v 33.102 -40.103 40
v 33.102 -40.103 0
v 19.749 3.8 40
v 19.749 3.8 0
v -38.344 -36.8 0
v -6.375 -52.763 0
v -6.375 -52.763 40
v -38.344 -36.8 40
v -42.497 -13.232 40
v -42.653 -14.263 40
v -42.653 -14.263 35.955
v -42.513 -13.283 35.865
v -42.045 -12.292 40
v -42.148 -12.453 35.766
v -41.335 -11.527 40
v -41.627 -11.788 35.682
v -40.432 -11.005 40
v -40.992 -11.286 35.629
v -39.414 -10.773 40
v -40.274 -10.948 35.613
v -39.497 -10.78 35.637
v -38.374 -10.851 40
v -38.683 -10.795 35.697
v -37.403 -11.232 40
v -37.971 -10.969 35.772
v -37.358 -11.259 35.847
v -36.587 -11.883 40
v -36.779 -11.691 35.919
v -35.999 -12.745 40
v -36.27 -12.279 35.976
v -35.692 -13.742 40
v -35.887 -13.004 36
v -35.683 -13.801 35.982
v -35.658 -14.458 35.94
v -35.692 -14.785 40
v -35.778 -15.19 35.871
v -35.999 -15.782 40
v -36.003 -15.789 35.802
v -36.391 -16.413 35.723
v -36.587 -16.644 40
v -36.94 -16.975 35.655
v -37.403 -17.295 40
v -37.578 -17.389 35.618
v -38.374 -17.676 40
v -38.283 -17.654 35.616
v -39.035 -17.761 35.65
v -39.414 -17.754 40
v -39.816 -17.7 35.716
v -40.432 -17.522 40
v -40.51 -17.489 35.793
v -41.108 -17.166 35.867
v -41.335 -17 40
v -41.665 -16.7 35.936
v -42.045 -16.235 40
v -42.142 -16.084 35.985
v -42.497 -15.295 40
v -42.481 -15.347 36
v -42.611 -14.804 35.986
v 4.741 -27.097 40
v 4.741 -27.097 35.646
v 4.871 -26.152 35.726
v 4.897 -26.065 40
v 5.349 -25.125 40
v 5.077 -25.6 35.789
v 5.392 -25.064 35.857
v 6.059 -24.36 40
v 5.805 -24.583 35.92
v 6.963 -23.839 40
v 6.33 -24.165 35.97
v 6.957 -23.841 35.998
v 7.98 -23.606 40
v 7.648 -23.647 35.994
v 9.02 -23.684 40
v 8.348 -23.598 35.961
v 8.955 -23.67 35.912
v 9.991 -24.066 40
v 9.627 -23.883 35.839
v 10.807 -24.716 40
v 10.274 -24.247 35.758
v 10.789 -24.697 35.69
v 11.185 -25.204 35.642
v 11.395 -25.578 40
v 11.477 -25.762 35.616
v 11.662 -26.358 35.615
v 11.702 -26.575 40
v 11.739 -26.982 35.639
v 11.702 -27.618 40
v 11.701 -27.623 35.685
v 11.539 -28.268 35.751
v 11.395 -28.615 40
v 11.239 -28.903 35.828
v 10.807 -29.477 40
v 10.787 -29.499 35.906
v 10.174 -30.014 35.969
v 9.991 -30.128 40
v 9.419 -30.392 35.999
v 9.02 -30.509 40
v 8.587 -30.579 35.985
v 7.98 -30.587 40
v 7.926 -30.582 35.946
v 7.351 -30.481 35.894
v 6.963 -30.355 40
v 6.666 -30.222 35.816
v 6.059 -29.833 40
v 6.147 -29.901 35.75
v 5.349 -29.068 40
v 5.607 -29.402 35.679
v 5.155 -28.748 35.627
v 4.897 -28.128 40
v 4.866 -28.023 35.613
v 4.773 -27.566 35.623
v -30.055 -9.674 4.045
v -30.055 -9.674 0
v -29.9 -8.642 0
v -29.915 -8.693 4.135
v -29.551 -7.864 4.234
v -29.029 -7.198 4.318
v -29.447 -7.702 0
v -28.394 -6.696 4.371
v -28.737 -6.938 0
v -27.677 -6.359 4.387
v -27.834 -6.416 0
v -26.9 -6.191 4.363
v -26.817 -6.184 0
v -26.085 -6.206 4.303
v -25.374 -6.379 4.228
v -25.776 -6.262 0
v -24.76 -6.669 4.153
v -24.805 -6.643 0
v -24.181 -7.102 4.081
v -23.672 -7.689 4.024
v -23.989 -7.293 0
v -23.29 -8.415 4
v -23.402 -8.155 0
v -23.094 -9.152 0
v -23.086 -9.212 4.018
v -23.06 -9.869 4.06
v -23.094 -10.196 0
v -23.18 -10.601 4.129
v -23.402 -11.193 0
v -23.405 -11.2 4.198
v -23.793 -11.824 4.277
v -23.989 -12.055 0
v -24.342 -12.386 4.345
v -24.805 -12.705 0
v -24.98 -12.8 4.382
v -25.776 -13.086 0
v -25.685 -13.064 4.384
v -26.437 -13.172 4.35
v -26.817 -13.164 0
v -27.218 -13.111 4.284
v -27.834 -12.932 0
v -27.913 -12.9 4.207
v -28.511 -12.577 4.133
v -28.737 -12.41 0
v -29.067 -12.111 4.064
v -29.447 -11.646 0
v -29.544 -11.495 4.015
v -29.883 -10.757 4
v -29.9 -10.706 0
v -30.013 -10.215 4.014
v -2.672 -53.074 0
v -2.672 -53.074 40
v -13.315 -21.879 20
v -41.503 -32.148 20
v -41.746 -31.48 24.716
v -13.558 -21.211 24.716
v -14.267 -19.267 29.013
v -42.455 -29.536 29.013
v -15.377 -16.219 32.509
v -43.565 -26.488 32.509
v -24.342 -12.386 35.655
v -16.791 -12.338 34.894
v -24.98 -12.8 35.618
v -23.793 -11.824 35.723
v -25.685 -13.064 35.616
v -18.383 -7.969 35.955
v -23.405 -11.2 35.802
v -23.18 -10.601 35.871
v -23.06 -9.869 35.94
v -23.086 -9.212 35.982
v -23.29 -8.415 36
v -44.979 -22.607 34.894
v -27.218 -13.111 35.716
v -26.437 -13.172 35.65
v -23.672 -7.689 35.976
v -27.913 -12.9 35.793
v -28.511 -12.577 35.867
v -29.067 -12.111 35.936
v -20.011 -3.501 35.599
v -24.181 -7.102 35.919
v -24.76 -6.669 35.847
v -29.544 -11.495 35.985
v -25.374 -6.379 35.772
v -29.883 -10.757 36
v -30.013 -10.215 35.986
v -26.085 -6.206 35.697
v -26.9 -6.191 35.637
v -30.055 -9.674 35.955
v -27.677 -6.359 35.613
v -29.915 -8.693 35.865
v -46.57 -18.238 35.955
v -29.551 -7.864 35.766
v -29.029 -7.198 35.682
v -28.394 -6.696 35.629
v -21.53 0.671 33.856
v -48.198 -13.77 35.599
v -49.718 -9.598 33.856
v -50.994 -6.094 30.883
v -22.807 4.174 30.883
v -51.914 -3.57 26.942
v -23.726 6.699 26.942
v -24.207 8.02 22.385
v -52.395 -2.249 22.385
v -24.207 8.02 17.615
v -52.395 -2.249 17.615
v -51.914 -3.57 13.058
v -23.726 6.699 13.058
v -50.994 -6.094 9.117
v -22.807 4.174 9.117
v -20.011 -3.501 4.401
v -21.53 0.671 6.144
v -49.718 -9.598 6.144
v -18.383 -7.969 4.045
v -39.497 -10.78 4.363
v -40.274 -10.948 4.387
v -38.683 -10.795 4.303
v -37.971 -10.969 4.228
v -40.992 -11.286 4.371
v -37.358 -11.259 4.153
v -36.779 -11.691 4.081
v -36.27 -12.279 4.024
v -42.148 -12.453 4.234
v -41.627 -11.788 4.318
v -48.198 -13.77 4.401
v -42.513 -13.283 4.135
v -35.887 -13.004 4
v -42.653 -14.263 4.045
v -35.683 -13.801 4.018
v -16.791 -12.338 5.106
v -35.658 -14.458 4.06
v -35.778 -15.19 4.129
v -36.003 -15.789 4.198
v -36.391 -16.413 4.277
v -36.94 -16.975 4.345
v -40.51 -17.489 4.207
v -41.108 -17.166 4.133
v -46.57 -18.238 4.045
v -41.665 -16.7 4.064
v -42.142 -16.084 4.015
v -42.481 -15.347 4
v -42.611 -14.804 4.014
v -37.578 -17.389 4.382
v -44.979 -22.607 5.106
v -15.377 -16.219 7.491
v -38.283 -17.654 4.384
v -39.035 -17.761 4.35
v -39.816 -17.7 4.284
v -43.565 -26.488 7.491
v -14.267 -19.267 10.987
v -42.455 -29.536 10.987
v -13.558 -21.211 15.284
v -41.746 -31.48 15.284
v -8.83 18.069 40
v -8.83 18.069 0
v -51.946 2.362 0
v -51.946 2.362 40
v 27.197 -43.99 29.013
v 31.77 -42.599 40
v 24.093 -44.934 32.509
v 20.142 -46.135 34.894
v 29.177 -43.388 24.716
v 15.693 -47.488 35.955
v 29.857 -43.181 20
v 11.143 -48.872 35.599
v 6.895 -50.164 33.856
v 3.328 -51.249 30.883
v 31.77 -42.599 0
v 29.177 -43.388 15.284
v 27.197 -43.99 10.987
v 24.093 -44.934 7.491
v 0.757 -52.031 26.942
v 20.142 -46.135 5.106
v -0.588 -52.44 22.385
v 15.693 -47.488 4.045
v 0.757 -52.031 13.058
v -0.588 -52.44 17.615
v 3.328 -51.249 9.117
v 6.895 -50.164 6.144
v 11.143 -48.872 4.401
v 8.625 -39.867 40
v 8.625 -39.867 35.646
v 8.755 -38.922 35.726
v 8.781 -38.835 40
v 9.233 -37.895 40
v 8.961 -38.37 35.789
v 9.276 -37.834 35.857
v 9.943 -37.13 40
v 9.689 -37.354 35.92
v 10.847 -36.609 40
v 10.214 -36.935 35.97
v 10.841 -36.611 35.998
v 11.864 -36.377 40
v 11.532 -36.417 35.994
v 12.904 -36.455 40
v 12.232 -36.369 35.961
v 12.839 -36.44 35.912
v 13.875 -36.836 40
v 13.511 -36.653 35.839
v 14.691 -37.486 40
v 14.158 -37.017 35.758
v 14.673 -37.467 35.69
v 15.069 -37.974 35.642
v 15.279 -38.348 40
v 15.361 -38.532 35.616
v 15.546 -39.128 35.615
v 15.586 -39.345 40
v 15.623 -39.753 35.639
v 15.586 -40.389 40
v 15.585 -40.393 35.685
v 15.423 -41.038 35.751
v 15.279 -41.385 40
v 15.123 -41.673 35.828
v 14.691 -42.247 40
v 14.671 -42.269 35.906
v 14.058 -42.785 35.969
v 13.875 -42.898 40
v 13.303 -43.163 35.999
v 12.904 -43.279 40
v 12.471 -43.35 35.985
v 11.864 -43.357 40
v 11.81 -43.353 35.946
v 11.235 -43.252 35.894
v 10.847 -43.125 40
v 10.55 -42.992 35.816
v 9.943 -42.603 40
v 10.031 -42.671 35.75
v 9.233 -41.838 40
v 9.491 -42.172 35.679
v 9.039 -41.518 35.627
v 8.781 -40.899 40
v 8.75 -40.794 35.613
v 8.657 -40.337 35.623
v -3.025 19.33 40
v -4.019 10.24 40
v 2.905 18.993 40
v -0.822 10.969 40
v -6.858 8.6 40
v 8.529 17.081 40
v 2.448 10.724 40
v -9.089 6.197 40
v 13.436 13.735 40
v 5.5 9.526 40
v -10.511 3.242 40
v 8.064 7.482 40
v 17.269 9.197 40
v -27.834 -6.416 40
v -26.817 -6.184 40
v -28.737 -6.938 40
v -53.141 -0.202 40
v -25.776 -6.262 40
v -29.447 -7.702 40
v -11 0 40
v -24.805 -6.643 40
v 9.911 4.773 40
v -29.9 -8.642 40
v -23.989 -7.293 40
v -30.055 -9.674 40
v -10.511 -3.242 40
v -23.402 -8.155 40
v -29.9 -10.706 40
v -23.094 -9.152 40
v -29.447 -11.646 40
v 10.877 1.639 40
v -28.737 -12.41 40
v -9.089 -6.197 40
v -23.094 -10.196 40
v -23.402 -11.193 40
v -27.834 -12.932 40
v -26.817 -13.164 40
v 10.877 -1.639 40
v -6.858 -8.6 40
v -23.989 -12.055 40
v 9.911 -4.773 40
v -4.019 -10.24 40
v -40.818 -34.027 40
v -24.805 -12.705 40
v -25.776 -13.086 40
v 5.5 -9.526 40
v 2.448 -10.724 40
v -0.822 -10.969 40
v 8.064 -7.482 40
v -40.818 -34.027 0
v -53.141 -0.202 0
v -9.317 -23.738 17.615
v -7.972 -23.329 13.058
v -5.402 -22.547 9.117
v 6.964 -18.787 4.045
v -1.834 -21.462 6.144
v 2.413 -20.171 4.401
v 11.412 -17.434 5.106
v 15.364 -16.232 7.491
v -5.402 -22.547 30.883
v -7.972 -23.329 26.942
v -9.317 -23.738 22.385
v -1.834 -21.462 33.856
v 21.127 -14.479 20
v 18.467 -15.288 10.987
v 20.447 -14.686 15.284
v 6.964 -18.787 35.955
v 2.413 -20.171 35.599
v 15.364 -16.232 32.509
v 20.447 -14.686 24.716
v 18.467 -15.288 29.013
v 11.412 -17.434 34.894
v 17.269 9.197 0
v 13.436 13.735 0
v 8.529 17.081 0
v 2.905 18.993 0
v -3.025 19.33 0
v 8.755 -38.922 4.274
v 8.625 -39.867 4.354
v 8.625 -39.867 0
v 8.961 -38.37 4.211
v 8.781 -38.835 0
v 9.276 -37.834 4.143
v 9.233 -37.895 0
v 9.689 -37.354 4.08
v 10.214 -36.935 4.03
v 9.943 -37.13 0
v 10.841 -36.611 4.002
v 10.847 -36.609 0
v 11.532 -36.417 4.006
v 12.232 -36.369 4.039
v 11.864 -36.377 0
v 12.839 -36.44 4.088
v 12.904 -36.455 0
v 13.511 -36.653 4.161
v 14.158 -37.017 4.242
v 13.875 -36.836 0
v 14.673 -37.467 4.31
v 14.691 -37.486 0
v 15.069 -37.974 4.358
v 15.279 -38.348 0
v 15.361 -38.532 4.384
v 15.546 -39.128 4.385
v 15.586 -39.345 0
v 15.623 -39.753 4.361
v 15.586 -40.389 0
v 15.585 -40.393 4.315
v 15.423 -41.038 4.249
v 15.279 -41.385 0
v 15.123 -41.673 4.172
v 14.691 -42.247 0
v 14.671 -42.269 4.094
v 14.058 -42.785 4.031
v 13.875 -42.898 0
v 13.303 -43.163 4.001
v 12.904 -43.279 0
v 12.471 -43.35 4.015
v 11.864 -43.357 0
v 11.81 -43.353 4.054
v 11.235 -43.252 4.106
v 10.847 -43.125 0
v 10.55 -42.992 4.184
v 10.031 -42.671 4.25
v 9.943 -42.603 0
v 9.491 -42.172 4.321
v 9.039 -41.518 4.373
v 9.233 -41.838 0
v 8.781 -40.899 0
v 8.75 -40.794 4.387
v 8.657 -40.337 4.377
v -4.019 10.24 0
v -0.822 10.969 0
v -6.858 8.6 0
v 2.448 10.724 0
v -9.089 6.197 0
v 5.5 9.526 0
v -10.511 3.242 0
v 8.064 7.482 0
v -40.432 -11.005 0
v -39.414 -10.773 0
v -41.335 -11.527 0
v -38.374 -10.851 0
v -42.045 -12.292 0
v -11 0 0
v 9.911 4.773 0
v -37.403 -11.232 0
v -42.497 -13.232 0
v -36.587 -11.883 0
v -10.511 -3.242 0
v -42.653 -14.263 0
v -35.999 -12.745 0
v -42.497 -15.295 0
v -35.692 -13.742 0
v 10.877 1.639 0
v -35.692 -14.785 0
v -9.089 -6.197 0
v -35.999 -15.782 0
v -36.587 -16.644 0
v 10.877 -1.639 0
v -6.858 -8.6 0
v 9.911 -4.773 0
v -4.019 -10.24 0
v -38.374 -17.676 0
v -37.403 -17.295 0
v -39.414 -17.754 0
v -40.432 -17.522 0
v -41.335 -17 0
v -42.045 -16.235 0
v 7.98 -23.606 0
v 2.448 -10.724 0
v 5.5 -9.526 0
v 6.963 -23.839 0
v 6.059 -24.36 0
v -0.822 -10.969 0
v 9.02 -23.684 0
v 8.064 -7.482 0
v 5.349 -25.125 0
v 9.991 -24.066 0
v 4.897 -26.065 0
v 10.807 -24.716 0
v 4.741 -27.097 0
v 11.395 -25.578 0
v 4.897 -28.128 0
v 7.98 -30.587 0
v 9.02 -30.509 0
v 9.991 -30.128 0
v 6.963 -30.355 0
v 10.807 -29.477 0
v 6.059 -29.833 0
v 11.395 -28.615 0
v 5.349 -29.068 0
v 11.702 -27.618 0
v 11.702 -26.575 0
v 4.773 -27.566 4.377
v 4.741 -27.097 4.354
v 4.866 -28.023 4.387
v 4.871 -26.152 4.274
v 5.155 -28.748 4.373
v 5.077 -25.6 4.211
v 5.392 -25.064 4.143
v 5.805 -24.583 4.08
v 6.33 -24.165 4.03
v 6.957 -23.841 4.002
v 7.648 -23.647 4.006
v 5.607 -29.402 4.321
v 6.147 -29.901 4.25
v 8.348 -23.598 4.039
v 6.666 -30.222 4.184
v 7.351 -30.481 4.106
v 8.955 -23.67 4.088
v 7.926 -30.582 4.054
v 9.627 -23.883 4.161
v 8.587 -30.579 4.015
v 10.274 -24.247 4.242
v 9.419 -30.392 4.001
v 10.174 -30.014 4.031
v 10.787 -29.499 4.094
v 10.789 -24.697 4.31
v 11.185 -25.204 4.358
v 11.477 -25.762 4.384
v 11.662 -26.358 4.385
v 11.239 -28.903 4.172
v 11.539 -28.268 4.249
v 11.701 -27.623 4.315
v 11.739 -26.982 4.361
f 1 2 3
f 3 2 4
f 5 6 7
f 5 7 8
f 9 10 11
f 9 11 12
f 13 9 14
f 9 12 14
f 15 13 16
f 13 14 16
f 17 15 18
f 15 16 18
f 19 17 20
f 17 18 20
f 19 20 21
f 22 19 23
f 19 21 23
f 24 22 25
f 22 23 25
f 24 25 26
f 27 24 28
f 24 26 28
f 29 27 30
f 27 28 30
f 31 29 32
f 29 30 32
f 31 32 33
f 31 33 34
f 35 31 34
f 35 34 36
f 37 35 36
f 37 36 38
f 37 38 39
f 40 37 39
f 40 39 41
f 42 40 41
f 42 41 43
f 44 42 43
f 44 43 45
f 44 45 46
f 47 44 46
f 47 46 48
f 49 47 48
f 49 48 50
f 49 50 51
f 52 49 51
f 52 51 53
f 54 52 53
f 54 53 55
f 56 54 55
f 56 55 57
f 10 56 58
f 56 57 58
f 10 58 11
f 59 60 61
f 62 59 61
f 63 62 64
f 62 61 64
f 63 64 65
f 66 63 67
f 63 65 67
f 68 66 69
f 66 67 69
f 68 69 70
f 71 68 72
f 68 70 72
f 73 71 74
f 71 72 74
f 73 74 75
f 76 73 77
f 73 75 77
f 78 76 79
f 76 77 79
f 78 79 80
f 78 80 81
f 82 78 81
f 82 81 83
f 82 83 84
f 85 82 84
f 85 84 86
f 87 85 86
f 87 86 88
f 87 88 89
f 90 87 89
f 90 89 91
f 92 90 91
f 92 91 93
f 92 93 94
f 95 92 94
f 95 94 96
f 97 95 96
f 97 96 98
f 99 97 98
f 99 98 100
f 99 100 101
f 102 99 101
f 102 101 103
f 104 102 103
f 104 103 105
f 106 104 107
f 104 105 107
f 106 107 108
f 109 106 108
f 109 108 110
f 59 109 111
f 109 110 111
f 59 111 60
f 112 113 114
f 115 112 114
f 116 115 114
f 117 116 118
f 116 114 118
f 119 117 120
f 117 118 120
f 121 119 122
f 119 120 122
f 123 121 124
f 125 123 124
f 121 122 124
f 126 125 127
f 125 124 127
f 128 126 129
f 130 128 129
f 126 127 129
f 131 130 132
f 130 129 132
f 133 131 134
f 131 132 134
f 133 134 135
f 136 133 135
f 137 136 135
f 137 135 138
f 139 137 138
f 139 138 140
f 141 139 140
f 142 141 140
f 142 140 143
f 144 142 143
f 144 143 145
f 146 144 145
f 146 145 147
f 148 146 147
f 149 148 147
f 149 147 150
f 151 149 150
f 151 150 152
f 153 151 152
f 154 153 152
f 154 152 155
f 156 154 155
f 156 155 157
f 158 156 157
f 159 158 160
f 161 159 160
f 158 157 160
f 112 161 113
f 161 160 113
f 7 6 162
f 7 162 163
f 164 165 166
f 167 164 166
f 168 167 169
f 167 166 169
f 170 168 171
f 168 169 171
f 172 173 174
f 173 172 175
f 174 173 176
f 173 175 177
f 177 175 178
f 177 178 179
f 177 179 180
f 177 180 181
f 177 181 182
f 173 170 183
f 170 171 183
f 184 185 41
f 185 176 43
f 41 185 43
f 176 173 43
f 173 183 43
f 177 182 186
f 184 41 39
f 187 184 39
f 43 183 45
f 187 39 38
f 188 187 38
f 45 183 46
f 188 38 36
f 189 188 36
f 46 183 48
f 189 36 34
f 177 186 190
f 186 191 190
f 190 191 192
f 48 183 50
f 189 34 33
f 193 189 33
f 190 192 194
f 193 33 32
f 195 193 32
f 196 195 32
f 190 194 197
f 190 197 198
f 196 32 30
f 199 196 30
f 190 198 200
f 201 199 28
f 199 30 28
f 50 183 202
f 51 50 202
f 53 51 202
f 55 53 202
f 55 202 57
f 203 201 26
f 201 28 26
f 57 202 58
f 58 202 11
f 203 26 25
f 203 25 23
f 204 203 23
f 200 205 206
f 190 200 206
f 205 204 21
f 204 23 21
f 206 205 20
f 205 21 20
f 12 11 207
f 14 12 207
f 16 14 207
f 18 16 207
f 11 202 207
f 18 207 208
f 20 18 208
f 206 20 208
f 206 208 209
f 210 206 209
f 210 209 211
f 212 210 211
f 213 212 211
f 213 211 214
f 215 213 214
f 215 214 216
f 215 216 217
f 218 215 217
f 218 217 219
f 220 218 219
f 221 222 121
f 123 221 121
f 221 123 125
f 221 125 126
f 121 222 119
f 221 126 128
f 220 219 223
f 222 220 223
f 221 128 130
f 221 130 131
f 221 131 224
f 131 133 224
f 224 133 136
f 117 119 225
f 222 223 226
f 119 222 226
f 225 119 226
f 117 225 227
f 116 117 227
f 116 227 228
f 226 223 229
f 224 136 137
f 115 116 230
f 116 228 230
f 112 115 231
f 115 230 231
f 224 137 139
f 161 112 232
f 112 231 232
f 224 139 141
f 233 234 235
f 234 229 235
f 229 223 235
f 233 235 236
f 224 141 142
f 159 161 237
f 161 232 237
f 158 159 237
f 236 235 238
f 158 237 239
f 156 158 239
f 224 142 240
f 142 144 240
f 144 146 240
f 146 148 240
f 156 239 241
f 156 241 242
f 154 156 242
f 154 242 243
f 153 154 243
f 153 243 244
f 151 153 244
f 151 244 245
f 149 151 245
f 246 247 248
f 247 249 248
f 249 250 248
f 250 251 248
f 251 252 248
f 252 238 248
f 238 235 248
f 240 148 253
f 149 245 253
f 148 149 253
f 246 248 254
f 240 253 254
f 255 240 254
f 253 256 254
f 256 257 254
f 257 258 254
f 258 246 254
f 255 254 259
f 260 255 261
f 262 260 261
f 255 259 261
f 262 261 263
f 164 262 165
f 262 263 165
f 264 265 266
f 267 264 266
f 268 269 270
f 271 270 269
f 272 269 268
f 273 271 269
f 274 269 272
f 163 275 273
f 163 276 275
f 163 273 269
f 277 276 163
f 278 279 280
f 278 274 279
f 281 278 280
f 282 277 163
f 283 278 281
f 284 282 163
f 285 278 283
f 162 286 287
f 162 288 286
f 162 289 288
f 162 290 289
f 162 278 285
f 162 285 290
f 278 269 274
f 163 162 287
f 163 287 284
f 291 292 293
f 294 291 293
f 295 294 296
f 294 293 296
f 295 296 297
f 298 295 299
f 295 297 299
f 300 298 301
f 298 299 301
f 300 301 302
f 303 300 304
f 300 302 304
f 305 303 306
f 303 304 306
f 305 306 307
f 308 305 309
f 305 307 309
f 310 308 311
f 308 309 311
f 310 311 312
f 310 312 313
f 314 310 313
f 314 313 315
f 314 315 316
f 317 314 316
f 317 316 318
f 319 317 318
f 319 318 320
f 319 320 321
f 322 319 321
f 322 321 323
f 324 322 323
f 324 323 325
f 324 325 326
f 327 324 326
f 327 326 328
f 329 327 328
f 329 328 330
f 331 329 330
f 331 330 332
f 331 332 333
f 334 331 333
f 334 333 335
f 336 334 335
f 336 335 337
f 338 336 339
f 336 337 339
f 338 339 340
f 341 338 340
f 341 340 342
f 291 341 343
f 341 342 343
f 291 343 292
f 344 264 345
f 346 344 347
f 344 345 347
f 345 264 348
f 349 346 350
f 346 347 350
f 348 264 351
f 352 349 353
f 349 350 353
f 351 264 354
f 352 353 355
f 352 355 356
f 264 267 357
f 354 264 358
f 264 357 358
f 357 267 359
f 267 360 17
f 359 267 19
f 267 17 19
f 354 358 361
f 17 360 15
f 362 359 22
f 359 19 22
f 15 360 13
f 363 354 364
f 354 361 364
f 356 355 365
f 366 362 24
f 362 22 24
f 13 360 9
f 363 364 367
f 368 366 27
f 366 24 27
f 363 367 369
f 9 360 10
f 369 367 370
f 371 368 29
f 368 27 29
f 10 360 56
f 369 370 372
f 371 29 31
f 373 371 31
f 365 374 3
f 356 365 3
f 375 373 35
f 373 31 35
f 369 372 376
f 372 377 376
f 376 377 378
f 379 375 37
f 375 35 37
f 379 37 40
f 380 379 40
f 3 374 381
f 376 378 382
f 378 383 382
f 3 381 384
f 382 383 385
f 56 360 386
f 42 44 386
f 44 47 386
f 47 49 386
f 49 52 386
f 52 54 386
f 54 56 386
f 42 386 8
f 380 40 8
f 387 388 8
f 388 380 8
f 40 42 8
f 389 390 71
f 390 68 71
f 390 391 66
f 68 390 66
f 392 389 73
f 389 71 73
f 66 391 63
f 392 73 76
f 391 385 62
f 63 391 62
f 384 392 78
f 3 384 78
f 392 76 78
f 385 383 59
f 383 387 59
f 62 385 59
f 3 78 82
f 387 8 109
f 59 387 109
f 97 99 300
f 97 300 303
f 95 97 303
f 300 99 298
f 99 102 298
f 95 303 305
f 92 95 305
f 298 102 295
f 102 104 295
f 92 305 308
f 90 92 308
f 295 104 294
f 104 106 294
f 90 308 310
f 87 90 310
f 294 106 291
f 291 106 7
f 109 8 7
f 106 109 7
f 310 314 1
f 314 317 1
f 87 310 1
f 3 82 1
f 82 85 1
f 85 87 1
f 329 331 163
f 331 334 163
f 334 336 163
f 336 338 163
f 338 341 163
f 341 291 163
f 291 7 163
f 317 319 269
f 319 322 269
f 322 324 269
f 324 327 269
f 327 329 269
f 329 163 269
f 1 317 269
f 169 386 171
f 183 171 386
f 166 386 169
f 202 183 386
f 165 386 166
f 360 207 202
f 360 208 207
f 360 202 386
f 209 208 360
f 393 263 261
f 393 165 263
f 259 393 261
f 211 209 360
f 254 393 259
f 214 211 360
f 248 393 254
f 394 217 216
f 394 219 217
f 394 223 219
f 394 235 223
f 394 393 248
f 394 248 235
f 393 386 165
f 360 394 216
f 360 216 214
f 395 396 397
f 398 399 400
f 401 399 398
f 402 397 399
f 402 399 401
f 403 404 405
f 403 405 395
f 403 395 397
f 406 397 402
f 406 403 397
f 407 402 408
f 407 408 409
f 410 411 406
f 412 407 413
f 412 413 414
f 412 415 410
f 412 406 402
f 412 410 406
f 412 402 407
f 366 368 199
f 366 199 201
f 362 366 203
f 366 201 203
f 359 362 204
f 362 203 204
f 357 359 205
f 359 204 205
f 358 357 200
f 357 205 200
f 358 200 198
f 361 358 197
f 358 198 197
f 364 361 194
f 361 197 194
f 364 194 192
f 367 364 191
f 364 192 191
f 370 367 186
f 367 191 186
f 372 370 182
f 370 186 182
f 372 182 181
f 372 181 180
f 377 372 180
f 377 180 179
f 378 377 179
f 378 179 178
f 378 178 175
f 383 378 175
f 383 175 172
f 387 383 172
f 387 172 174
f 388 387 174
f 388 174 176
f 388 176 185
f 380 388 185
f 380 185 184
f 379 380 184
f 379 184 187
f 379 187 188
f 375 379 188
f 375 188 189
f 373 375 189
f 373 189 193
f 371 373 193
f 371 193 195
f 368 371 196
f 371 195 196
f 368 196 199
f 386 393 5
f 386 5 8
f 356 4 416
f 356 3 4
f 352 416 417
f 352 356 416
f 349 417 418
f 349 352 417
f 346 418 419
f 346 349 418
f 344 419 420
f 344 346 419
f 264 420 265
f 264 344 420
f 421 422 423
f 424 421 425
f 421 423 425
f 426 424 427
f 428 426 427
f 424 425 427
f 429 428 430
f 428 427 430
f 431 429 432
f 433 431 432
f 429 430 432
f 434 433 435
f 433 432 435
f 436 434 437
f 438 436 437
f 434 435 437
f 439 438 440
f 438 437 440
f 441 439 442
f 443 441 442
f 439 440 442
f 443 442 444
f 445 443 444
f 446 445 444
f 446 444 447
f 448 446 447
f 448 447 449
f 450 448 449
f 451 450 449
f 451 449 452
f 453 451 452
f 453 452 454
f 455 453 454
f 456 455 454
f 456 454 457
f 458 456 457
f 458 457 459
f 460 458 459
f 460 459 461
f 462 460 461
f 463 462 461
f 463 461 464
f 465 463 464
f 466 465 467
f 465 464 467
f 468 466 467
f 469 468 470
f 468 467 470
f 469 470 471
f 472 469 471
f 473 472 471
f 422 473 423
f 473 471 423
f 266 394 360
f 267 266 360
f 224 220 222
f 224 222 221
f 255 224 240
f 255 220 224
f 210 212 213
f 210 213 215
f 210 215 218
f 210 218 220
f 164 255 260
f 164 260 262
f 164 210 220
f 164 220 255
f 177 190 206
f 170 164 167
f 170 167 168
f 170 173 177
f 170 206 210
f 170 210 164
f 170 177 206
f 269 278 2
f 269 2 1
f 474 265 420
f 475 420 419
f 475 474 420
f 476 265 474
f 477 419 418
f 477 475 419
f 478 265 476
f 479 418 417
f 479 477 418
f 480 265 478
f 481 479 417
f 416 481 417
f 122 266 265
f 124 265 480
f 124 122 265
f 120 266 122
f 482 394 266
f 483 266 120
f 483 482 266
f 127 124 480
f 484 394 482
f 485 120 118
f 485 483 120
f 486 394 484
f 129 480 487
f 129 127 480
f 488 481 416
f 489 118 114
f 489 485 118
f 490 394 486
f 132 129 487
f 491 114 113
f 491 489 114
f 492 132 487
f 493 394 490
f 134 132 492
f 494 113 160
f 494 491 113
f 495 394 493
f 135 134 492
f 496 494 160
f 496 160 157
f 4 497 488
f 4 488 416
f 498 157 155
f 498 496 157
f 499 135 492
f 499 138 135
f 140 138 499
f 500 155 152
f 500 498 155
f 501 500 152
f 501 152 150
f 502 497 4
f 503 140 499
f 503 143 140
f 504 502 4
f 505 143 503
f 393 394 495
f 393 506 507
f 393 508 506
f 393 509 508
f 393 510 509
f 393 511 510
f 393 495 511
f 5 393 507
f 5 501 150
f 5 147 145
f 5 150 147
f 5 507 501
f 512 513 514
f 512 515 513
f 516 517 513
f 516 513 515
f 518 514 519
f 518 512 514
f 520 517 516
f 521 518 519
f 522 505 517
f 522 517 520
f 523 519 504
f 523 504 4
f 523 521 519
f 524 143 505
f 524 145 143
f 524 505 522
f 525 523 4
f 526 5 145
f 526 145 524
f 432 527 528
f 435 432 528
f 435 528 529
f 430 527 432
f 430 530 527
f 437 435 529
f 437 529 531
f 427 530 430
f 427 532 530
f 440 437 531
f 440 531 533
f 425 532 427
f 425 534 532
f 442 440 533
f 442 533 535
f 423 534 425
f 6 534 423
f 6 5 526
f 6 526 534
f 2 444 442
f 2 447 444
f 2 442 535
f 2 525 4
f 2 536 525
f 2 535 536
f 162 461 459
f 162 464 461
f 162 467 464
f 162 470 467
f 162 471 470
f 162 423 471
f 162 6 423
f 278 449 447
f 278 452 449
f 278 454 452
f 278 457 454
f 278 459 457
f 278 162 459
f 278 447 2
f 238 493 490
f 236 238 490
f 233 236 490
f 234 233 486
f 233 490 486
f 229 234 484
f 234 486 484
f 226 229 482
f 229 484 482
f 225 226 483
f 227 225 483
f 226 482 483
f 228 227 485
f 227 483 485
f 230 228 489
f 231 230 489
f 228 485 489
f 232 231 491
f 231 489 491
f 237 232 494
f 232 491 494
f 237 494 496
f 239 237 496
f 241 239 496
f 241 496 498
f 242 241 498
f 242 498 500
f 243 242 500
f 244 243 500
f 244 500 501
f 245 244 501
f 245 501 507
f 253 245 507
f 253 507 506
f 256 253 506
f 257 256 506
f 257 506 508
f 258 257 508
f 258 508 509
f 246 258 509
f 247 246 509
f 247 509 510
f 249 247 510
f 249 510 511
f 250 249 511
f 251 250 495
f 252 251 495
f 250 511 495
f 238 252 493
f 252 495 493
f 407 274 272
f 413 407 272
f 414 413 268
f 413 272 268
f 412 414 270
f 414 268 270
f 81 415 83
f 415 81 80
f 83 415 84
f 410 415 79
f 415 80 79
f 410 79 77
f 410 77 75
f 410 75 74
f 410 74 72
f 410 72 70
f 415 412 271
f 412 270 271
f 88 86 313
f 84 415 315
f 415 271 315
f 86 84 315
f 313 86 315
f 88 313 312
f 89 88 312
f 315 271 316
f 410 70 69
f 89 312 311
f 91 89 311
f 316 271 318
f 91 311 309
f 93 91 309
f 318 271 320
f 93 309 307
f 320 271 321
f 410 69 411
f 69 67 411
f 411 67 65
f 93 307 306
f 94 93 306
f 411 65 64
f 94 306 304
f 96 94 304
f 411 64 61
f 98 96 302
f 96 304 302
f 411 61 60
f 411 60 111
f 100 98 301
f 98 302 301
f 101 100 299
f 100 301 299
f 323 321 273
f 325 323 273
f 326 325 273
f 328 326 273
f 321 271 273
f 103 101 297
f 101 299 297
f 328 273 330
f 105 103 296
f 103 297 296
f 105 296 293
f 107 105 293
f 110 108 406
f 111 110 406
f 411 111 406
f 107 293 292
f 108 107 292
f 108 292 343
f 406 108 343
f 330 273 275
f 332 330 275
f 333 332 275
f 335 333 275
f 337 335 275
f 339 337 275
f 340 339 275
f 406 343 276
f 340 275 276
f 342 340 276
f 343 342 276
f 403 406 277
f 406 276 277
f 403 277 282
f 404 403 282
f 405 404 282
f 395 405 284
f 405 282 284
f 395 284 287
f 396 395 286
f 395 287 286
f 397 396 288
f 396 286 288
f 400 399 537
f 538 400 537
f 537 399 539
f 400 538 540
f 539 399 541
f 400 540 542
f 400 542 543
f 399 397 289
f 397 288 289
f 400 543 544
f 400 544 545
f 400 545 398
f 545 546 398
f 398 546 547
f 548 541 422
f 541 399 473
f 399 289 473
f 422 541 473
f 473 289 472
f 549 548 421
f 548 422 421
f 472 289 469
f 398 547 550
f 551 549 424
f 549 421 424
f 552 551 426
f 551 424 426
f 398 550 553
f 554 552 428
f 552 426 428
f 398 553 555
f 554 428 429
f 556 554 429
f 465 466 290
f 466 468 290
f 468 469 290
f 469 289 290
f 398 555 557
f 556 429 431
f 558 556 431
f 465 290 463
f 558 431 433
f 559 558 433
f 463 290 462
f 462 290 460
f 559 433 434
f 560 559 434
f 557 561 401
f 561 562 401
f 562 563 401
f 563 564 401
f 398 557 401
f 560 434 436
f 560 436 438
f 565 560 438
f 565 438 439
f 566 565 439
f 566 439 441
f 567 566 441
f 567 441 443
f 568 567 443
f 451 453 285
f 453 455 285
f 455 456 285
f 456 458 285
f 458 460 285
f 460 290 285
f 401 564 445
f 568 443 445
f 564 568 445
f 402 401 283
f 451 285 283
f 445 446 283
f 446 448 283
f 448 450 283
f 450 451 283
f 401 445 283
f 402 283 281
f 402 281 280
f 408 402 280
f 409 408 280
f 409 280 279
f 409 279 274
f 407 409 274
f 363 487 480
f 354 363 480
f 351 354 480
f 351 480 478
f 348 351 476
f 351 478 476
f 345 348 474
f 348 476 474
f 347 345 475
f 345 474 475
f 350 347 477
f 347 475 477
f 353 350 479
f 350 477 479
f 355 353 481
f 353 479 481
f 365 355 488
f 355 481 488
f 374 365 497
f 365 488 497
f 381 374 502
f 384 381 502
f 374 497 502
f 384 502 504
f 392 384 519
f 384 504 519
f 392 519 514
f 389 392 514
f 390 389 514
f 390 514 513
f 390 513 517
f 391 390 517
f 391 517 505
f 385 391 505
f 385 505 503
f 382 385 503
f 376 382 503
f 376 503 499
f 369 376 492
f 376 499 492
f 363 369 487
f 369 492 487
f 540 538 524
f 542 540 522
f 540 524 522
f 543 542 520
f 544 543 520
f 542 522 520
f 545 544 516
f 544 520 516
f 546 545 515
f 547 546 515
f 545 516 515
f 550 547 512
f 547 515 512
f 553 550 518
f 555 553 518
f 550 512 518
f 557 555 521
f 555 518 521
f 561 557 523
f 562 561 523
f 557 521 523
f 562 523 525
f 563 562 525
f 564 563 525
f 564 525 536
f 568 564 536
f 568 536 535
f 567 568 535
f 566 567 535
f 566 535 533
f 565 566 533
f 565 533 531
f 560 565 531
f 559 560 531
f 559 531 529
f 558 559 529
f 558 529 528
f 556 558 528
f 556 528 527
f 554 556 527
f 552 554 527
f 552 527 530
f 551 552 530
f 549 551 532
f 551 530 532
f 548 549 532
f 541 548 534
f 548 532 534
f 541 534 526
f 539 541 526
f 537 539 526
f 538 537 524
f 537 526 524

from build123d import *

# Parameters (mm, degrees)
BOSS_EXTRUDE1_DEPTH = 40
SKETCH2_R           = 16
CUT_EXTRUDE1_DEPTH  = 30
SKETCH3_R           = 16
CUT_EXTRUDE2_DEPTH  = 30
CUT_EXTRUDE3_REACH  = 87.885
SKETCH4_R           = 3.5
SKETCH6_W           = 97.811122408
SKETCH6_H           = 40
BOSS_EXTRUDE2_DEPTH = 30
SKETCH5_R           = 11
CUT_EXTRUDE4_DEPTH  = 40
CUT_EXTRUDE7_DEPTH  = 40
FILLET1_R           = 22
CHAMFER1_SIZE       = 2
CHAMFER2_SIZE       = 2


with BuildPart() as part:
    # Sketch1 → Boss-Extrude1 (new body)
    with BuildSketch(Plane.XY):
        Polygon((-40.424029814, 28.51734538), (47.085187233, -15.176505431), (33.683689612, -42.016771106), (-53.825527435, 1.677079705), align=None)
        Polygon((-53.825527435, 1.677079705), (33.683689612, -42.016771106), (-4.585446216, -53.656068464), (-40.133712767, -35.906616376), align=None)
    extrude(amount=BOSS_EXTRUDE1_DEPTH)

    # Sketch2 → Cut-Extrude1 (cut)
    with BuildSketch(Plane(origin=(14.549121698, -47.836419785, 0), x_dir=(-0.9567283956954932, -0.29098243395423, 0), z_dir=(0.29098243395423, -0.9567283956954933, 0))):
        with Locations(Location((0, -20, 0), (0, 0, 180))):
            Circle(SKETCH2_R)
    extrude(amount=-CUT_EXTRUDE1_DEPTH, mode=Mode.SUBTRACT)

    # Sketch3 → Cut-Extrude2 (cut)
    with BuildSketch(Plane(origin=(-46.979620101, -17.114768336, 0), x_dir=(0, 0, 1), z_dir=(-0.939592402016652, -0.342295366712111, 0))):
        with Locations(Location((20, 0, 0), (0, 0, 270))):
            Circle(SKETCH3_R)
    extrude(amount=-CUT_EXTRUDE2_DEPTH, mode=Mode.SUBTRACT)

    # Cut-Extrude3: up to this face of the body (flat: up to its plane)
    cut_extrude3_end = Plane(part.part.faces().sort_by_distance((-8.066388037, -16.155209221, 40))[0])
    # Sketch4 → Cut-Extrude3 (cut, up to the picked face)
    with BuildSketch(Plane(origin=(0, 0, 0), x_dir=(-1, 0, 0), z_dir=(0, 0, -1)), mode=Mode.PRIVATE) as cut_extrude3_sk1:
        with Locations((-8.241246184, -27.096598695)):
            Circle(SKETCH4_R)
    cut_extrude3_tool1 = split(extrude(cut_extrude3_sk1.sketch, amount=-CUT_EXTRUDE3_REACH, mode=Mode.PRIVATE), bisect_by=cut_extrude3_end, keep=Keep.BOTH, mode=Mode.PRIVATE)
    # Sketch4 → Cut-Extrude3 (cut, up to the picked face)
    with BuildSketch(Plane(origin=(0, 0, 0), x_dir=(-1, 0, 0), z_dir=(0, 0, -1)), mode=Mode.PRIVATE) as cut_extrude3_sk2:
        with Locations((-12.125238023, -39.866872249)):
            Circle(SKETCH4_R)
    cut_extrude3_tool2 = split(extrude(cut_extrude3_sk2.sketch, amount=-CUT_EXTRUDE3_REACH, mode=Mode.PRIVATE), bisect_by=cut_extrude3_end, keep=Keep.BOTH, mode=Mode.PRIVATE)
    # Sketch4 → Cut-Extrude3 (cut, up to the picked face)
    with BuildSketch(Plane(origin=(0, 0, 0), x_dir=(-1, 0, 0), z_dir=(0, 0, -1)), mode=Mode.PRIVATE) as cut_extrude3_sk3:
        with Locations((26.555072549, -9.674065347)):
            Circle(SKETCH4_R)
    cut_extrude3_tool3 = split(extrude(cut_extrude3_sk3.sketch, amount=-CUT_EXTRUDE3_REACH, mode=Mode.PRIVATE), bisect_by=cut_extrude3_end, keep=Keep.BOTH, mode=Mode.PRIVATE)
    # Sketch4 → Cut-Extrude3 (cut, up to the picked face)
    with BuildSketch(Plane(origin=(0, 0, 0), x_dir=(-1, 0, 0), z_dir=(0, 0, -1)), mode=Mode.PRIVATE) as cut_extrude3_sk4:
        with Locations((39.152815392, -14.263447931)):
            Circle(SKETCH4_R)
    cut_extrude3_tool4 = split(extrude(cut_extrude3_sk4.sketch, amount=-CUT_EXTRUDE3_REACH, mode=Mode.PRIVATE), bisect_by=cut_extrude3_end, keep=Keep.BOTH, mode=Mode.PRIVATE)
    add(cut_extrude3_tool1.solids().sort_by(Axis((8.241246, -27.096599, 0), (0, 0, 1)))[0], mode=Mode.SUBTRACT)
    add(cut_extrude3_tool2.solids().sort_by(Axis((12.125238, -39.866872, 0), (0, 0, 1)))[0], mode=Mode.SUBTRACT)
    add(cut_extrude3_tool3.solids().sort_by(Axis((-26.555073, -9.674065, 0), (0, 0, 1)))[0], mode=Mode.SUBTRACT)
    add(cut_extrude3_tool4.solids().sort_by(Axis((-39.152815, -14.263448, 0), (0, 0, 1)))[0], mode=Mode.SUBTRACT)

    # Sketch6 → Boss-Extrude2 (add)
    with BuildSketch(Plane(origin=(3.33057871, 6.670419974, 0), x_dir=(0.8946755224974542, -0.4467165873838887, 0), z_dir=(0.4467165873838887, 0.8946755224974542, 0))):
        with Locations((0, -20)):
            Rectangle(SKETCH6_W, SKETCH6_H)
    extrude(amount=BOSS_EXTRUDE2_DEPTH)

    # Sketch5 → Cut-Extrude4 (cut)
    with BuildSketch(Plane(origin=(0, 0, 0), x_dir=(-1, 0, 0), z_dir=(0, 0, -1))):
        Circle(SKETCH5_R)
    extrude(amount=-CUT_EXTRUDE4_DEPTH, mode=Mode.SUBTRACT)

    # Sketch7 → Cut-Extrude7 (cut)
    with BuildSketch(Plane(origin=(0, 0, 0), x_dir=(-1, 0, 0), z_dir=(0, 0, -1))):
        Polygon((-60.486684855, 11.663760244), (-33.683689612, -42.016771106), (-12.991209784, 26.018548963), (-23.829432932, 29.966935049), align=None)
        Polygon((-23.829432932, 29.966935049), (-12.991209784, 26.018548963), (-9.634719731, 37.05443625), align=None)
        Polygon((-9.634719731, 37.05443625), (-12.991209784, 26.018548963), (53.825527435, 1.677079705), (27.022532192, 55.357611055), align=None)
    extrude(amount=-CUT_EXTRUDE7_DEPTH, mode=Mode.SUBTRACT)

    # Fillet1
    fillet1_edges = [part.edges().sort_by_distance(p)[0] for p in [
        (12.991209784, 26.018548963, 20),
    ]]
    fillet(fillet1_edges, radius=FILLET1_R)

    # Chamfer1
    chamfer1_edges = [part.edges().sort_by_distance(p)[0] for p in [
        (33.683689612, -42.016771106, 20),
        (-53.825527435, 1.677079705, 20),
    ]]
    chamfer(chamfer1_edges, length=CHAMFER1_SIZE)

    # Chamfer2
    chamfer2_edges = [part.edges().sort_by_distance(p)[0] for p in [
        (-4.585446216, -53.656068464, 20),
        (-40.133712767, -35.906616376, 20),
    ]]
    chamfer(chamfer2_edges, length=CHAMFER2_SIZE)


solid = part.part
